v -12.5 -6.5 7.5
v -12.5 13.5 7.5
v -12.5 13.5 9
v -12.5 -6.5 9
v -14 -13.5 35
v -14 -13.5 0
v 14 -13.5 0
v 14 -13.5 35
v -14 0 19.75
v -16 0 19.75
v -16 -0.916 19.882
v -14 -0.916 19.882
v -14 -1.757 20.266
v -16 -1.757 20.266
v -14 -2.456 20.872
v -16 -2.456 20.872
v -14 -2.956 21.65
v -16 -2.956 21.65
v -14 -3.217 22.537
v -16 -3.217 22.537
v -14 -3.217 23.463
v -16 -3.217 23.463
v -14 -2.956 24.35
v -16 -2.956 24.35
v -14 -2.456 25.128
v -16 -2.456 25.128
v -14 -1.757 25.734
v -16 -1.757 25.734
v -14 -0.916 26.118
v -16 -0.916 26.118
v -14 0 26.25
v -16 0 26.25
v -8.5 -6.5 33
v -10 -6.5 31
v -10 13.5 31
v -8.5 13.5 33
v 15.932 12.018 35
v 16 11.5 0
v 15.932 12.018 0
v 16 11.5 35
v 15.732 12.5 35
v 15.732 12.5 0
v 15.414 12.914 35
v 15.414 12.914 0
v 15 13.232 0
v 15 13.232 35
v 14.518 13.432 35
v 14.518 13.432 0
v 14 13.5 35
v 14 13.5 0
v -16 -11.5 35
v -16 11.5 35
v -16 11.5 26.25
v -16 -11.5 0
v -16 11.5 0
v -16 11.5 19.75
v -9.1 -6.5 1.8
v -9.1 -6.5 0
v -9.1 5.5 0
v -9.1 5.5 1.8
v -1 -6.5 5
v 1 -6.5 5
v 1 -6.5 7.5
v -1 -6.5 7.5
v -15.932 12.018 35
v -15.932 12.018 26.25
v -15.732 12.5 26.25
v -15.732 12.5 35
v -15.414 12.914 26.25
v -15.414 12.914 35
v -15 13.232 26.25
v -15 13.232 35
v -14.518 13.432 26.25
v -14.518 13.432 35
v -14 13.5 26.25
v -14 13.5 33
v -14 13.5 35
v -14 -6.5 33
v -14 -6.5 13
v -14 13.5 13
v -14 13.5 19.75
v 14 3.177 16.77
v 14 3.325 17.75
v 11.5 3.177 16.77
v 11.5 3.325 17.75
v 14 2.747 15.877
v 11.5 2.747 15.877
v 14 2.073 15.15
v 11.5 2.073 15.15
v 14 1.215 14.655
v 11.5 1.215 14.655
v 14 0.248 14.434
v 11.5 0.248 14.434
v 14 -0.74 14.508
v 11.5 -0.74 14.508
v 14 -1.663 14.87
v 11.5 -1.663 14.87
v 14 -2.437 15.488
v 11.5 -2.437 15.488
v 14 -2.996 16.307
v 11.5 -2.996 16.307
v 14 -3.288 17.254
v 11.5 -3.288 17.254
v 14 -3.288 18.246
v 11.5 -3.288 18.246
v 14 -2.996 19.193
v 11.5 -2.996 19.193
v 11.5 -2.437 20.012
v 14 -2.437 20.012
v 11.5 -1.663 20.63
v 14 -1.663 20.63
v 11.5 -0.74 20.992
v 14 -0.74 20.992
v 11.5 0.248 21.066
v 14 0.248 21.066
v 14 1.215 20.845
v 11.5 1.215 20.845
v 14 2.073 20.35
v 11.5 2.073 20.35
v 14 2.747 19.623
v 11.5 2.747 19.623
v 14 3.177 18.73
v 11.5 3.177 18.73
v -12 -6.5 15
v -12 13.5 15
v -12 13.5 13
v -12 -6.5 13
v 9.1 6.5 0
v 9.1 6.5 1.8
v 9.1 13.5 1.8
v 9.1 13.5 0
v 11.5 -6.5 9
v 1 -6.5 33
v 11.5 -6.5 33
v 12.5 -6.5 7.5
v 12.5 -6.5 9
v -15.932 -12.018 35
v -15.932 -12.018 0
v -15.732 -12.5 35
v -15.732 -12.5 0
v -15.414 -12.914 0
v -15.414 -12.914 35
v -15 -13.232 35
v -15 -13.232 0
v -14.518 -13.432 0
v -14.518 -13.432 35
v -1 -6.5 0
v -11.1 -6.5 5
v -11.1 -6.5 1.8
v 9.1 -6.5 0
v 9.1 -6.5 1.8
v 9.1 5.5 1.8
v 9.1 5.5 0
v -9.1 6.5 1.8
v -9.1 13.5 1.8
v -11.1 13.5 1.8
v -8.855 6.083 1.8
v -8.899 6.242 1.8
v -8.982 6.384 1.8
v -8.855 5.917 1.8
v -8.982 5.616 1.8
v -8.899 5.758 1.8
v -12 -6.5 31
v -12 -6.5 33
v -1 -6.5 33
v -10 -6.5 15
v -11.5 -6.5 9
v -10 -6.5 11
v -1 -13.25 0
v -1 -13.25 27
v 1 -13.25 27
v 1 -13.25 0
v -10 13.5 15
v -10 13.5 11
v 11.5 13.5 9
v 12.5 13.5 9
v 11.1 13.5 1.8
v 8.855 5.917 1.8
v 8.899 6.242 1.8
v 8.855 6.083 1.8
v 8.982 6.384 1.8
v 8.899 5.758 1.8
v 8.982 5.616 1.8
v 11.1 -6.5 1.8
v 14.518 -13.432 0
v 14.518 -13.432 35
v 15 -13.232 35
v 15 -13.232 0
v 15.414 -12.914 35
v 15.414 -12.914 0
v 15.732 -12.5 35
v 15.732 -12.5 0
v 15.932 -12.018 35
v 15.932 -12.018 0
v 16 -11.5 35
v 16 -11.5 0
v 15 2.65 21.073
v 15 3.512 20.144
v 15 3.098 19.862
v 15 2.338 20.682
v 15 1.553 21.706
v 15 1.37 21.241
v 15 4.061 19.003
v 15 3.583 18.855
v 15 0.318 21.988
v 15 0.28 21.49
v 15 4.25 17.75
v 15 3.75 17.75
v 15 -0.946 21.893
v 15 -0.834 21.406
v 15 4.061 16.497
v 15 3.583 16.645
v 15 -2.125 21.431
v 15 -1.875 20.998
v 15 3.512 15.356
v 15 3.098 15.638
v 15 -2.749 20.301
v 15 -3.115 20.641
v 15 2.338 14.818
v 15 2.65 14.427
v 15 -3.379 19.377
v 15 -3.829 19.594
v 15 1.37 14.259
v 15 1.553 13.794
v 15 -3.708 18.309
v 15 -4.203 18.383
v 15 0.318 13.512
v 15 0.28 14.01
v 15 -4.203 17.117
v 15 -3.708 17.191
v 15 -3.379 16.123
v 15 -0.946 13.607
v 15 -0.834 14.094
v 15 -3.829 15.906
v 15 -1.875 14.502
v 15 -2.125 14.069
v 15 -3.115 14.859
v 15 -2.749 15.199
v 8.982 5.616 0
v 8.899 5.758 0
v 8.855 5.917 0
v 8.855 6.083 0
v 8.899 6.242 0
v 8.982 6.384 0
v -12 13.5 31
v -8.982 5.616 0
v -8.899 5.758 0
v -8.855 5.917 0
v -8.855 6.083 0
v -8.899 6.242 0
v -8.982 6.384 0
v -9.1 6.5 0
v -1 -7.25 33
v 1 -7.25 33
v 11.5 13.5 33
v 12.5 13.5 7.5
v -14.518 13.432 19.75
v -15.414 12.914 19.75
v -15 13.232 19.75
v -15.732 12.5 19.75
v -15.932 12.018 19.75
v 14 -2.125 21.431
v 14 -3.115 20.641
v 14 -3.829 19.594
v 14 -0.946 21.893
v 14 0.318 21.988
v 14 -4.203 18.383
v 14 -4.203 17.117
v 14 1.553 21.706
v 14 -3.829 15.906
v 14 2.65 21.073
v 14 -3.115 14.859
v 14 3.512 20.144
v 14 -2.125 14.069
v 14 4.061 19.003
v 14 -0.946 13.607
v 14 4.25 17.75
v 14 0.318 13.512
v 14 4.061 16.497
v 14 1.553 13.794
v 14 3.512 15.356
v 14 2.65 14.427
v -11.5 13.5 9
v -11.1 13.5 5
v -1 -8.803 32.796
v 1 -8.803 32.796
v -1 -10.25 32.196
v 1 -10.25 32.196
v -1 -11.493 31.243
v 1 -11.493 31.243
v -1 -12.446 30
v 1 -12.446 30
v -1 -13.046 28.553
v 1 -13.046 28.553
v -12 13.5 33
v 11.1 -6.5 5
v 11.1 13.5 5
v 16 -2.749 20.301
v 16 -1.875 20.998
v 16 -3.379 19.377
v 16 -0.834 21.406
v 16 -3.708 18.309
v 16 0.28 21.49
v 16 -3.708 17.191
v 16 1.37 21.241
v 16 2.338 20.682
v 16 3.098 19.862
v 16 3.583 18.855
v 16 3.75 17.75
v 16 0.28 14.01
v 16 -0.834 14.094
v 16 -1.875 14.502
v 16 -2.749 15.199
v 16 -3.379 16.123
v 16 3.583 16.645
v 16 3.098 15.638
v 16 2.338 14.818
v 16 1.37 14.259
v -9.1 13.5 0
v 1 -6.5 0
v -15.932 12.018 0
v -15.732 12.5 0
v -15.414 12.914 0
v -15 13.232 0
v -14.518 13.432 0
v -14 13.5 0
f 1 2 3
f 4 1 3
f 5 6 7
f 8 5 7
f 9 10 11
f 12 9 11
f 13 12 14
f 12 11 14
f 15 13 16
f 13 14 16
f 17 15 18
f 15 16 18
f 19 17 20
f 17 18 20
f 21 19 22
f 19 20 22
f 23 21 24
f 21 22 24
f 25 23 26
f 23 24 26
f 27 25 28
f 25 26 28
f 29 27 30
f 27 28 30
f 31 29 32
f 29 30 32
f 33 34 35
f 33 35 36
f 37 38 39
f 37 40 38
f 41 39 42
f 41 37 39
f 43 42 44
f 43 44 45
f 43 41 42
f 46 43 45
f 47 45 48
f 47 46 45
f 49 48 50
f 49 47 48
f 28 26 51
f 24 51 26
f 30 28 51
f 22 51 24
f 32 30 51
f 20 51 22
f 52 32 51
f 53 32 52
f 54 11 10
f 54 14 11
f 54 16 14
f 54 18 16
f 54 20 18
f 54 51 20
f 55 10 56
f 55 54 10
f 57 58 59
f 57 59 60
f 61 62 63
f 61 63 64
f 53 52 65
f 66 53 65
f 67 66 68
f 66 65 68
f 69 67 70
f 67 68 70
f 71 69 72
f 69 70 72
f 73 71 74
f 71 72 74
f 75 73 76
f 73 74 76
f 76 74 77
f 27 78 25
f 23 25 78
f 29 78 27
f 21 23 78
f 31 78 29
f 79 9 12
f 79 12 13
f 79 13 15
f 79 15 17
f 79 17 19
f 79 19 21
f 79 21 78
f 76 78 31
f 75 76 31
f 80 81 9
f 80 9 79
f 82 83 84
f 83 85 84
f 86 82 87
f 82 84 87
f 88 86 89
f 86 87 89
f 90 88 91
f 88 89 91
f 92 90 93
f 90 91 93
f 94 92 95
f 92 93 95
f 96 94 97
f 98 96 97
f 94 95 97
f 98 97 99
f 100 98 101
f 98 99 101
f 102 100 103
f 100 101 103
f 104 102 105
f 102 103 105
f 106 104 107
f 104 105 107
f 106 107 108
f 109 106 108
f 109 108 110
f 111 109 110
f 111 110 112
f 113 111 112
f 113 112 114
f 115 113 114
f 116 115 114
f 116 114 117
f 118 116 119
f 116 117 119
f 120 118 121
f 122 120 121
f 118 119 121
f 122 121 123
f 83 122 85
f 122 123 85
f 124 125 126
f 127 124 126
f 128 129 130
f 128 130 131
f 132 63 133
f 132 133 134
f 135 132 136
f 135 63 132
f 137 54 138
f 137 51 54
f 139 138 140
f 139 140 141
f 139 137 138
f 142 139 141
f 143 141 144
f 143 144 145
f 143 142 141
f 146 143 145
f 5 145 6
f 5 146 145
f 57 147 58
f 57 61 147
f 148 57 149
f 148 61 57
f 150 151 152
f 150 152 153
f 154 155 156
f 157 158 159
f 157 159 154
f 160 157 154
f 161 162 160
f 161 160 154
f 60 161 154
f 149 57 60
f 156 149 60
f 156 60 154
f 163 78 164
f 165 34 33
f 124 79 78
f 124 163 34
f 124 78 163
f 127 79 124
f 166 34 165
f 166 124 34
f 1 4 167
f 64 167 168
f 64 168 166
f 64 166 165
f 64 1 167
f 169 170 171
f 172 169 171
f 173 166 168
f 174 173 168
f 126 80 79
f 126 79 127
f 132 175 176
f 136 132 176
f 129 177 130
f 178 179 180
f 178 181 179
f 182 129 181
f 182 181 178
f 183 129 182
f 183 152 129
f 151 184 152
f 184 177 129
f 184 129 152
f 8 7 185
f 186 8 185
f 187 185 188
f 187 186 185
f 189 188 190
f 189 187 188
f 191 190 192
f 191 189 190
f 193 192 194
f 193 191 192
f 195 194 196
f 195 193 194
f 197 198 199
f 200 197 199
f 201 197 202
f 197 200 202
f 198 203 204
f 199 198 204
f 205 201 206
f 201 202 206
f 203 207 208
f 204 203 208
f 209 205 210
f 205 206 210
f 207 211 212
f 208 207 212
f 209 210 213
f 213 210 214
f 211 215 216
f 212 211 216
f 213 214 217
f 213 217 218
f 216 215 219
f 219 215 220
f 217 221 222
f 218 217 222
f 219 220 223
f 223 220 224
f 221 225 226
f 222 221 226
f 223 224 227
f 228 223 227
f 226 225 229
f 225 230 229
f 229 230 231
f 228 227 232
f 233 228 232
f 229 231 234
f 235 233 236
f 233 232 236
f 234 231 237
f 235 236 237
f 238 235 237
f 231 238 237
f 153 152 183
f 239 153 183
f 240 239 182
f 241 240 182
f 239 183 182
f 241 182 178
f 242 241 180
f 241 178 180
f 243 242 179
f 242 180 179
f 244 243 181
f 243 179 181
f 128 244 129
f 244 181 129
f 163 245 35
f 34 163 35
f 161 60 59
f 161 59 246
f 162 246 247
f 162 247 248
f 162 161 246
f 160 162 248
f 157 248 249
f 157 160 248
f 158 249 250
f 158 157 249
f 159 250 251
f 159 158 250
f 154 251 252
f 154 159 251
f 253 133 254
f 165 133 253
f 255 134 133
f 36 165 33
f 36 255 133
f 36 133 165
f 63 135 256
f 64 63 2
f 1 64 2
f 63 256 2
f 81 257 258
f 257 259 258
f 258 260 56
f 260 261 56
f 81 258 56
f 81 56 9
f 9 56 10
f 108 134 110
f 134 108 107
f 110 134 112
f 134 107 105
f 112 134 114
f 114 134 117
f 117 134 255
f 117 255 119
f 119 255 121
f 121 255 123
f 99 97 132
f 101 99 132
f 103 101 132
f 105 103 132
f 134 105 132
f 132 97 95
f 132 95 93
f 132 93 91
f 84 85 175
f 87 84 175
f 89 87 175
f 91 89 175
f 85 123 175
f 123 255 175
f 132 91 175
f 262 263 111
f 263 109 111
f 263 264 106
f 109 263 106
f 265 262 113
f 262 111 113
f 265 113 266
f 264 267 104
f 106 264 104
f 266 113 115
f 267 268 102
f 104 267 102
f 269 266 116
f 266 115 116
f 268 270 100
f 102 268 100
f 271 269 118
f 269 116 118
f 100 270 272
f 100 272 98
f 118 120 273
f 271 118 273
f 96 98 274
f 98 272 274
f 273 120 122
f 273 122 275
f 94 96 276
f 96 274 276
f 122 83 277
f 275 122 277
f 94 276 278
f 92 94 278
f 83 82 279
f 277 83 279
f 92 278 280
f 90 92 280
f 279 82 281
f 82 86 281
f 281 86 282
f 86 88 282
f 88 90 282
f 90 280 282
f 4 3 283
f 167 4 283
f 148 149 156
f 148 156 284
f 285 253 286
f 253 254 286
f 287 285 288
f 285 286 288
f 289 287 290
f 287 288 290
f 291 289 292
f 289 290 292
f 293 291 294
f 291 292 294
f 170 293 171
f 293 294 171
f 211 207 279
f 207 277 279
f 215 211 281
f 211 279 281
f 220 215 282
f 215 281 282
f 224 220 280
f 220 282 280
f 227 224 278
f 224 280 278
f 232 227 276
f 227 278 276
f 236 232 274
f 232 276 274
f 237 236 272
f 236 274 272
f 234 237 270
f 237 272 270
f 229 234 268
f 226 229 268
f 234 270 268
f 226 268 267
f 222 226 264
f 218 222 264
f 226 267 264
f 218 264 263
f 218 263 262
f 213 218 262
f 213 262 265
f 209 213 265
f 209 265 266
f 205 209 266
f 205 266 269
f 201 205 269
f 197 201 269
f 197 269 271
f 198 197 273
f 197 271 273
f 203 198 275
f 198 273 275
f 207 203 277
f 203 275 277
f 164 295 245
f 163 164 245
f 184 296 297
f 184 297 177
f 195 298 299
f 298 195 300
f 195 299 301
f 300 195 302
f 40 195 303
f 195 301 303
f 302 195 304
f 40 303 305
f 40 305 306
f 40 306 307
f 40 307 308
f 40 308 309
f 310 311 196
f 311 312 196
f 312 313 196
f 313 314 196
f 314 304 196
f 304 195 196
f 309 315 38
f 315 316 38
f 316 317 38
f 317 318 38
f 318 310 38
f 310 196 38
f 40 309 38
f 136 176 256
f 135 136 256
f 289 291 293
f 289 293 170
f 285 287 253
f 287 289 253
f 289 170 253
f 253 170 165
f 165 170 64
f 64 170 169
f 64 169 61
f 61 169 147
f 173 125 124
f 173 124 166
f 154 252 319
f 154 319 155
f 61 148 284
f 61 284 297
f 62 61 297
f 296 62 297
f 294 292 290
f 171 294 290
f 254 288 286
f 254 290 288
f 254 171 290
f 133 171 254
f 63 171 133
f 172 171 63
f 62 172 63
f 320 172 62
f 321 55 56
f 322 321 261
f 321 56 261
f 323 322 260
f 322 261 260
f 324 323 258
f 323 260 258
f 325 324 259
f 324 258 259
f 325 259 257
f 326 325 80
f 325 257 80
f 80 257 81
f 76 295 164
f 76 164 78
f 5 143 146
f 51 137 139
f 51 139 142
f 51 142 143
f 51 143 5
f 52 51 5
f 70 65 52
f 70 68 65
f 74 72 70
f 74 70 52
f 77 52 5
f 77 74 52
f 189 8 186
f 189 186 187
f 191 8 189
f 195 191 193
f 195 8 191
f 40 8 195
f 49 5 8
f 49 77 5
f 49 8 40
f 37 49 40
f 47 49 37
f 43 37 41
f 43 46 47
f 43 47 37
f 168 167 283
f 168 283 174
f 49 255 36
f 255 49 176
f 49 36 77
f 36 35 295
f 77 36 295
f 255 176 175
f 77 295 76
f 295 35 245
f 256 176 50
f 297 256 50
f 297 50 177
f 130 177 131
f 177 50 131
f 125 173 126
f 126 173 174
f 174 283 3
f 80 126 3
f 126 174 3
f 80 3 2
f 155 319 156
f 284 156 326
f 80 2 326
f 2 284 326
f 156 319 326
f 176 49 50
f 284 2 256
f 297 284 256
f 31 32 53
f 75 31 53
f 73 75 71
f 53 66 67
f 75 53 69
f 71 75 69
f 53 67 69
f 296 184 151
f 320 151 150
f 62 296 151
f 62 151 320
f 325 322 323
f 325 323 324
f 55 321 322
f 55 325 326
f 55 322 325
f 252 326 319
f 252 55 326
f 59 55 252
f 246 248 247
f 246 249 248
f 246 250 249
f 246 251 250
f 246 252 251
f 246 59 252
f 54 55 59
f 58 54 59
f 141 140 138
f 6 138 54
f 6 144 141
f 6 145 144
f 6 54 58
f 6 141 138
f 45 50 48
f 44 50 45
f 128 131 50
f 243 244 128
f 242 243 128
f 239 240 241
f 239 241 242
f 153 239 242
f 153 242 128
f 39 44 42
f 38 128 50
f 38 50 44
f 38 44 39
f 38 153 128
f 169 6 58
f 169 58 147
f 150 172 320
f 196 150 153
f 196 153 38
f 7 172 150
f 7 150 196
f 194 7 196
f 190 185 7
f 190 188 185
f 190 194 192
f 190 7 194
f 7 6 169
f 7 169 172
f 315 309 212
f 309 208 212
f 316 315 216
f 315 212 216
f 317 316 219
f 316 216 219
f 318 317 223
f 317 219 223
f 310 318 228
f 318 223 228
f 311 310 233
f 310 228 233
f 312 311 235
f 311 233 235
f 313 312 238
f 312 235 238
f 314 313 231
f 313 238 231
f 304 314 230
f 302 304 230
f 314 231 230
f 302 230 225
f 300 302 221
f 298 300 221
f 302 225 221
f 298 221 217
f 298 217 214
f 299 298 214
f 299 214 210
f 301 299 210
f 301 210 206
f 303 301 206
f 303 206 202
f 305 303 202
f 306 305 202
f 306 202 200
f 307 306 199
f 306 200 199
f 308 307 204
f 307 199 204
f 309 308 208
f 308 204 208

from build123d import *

# Parameters (mm, degrees)
SKETCH1_W               = 32
SKETCH1_H               = 27
BOSS_EXTRUDE1_DEPTH     = 35
FILLET1_R               = 2
CUT_EXTRUDE1_DEPTH      = 1
CUT_EXTRUDE1_DEPTH_BACK = 28
BOSS_EXTRUDE2_DEPTH     = 7
BOSS_EXTRUDE3_DEPTH     = 1.8
SKETCH5_W               = 2
SKETCH5_H               = 7
CUT_EXTRUDE2_DEPTH      = 33
CUT_EXTRUDE3_DEPTH      = 20
SKETCH7_W               = 2
SKETCH7_H               = 33
BOSS_EXTRUDE4_DEPTH     = 0.25
FILLET2_R               = 6
CUT_EXTRUDE5_DEPTH      = 4.5
SKETCH14_W              = 2.5
SKETCH14_H              = 20
CUT_EXTRUDE6_DEPTH      = 20
SKETCH16_W              = 2
SKETCH16_H              = 4
SKETCH16_H_2            = 2
BOSS_EXTRUDE5_DEPTH     = 20
BOSS_EXTRUDE6_DEPTH     = 20


with BuildPart() as part:
    # Sketch1 → Boss-Extrude1 (new body)
    with BuildSketch(Plane.XY):
        Rectangle(SKETCH1_W, SKETCH1_H)
    extrude(amount=BOSS_EXTRUDE1_DEPTH)

    # Fillet1
    fillet1_edges = [part.edges().sort_by_distance(p)[0] for p in [
        (16, -13.5, 17.5),
        (-16, -13.5, 17.5),
        (-16, 13.5, 17.5),
        (16, 13.5, 17.5),
    ]]
    fillet(fillet1_edges, radius=FILLET1_R)

    # Sketch2 → Cut-Extrude1 (cut, two sides)
    with BuildSketch(Plane.XZ.offset(13.5)) as cut_extrude1_sk:
        Polygon((-9.1, 0), (-9.1, 1.8), (-11.1, 1.8), (-11.1, 5), (11.1, 5), (11.1, 1.8), (9.1, 1.8), (9.1, 0), align=None)
    extrude(amount=CUT_EXTRUDE1_DEPTH, mode=Mode.SUBTRACT)
    extrude(cut_extrude1_sk.sketch, amount=-CUT_EXTRUDE1_DEPTH_BACK, mode=Mode.SUBTRACT)

    # Sketch3 → Boss-Extrude2 (add)
    with BuildSketch(Plane.XZ.offset(13.5)):
        Polygon((-9.1, 0), (-9.1, 1.8), (-11.1, 1.8), (-11.1, 5), (11.1, 5), (11.1, 1.8), (9.1, 1.8), (9.1, 0), align=None)
    extrude(amount=-BOSS_EXTRUDE2_DEPTH)

    # Sketch4 → Boss-Extrude3 (add)
    with BuildSketch(Plane(origin=(0, 0, 1.8), x_dir=(-1, 0, 0), z_dir=(0, 0, -1))):
        with BuildLine():
            Line((-9.1, 6.5), (-9.1, 5.5))
            ThreePointArc((-9.1, 5.5), (-8.85, 6), (-9.1, 6.5))
        make_face()
    boss_extrude3 = extrude(amount=BOSS_EXTRUDE3_DEPTH)

    # Mirror1: Boss-Extrude3 across plane
    add(boss_extrude3.mirror(Plane(origin=(0, 0, 0), x_dir=(0, 0, 1), z_dir=(1, 0, 0))))

    # Sketch5 → Cut-Extrude2 (cut)
    with BuildSketch(Plane(origin=(0, 0, 0), x_dir=(-1, 0, 0), z_dir=(0, 0, -1))):
        with Locations((0, -10)):
            Rectangle(SKETCH5_W, SKETCH5_H)
    extrude(amount=-CUT_EXTRUDE2_DEPTH, mode=Mode.SUBTRACT)

    # Sketch6 → Cut-Extrude3 (cut)
    with BuildSketch(Plane(origin=(0, 13.5, 0), x_dir=(1, 0, 0), z_dir=(0, 1, 0))):
        Polygon((-12.5, -7.5), (-12.5, -9), (-11.5, -9), (-11.5, -33), (11.5, -33), (11.5, -9), (12.5, -9), (12.5, -7.5), align=None)
    extrude(amount=-CUT_EXTRUDE3_DEPTH, mode=Mode.SUBTRACT)

    # Sketch7 → Boss-Extrude4 (add)
    with BuildSketch(Plane.XZ.offset(13.5)):
        with Locations((0, 16.5)):
            Rectangle(SKETCH7_W, SKETCH7_H)
    extrude(amount=-BOSS_EXTRUDE4_DEPTH)

    # Fillet2
    fillet2_edges = [part.edges().sort_by_distance(p)[0] for p in [
        (0, -13.25, 33),
    ]]
    fillet(fillet2_edges, radius=FILLET2_R)

    # Sketch9 → Cut-Revolve1 (revolve, cut)
    with BuildSketch(Plane(origin=(0, 0, 17.75), x_dir=(-1, 0, 0), z_dir=(0, 0, -1))):
        Polygon((-15, 4.25), (-14, 4.25), (-14, 3.325), (-11.5, 3.325), (-11.5, 0), (-16, 0), (-16, 3.75), (-15, 3.75), align=None)
    revolve(axis=Axis((16, 0, 17.75), (-1, 0, 0)), mode=Mode.SUBTRACT)

    # Sketch11 → Cut-Extrude5 (cut)
    with BuildSketch(Plane(origin=(-16, 0, 44), x_dir=(0, 0, -1), z_dir=(1, 0, 0))):
        with BuildLine():
            Line((24.25, 23), (24.25, 0))
            ThreePointArc((24.25, 0), (21, -3.25), (17.75, 0))
            Line((17.75, 0), (17.75, 23))
            ThreePointArc((17.75, 23), (21, 26.25), (24.25, 23))
        make_face()
    extrude(amount=CUT_EXTRUDE5_DEPTH, mode=Mode.SUBTRACT)

    # Sketch14 → Cut-Extrude6 (cut)
    with BuildSketch(Plane(origin=(0, 13.5, 0), x_dir=(1, 0, 0), z_dir=(0, 1, 0))):
        with Locations((-12.75, -23)):
            Rectangle(SKETCH14_W, SKETCH14_H)
    extrude(amount=-CUT_EXTRUDE6_DEPTH, mode=Mode.SUBTRACT)

    # Sketch16 → Boss-Extrude5 (add)
    with BuildSketch(Plane(origin=(0, 13.5, 0), x_dir=(1, 0, 0), z_dir=(0, 1, 0))):
        with Locations((-11, -13)):
            Rectangle(SKETCH16_W, SKETCH16_H)
        with Locations((-11, -32)):
            Rectangle(SKETCH16_W, SKETCH16_H_2)
    extrude(amount=-BOSS_EXTRUDE5_DEPTH)

    # Sketch20 → Boss-Extrude6 (add)
    with BuildSketch(Plane(origin=(0, 13.5, 0), x_dir=(1, 0, 0), z_dir=(0, 1, 0))):
        Polygon((-11.5, -9), (-10, -11), (-11.5, -11), align=None)
        Polygon((-10, -31), (-8.5, -33), (-10, -33), align=None)
    extrude(amount=-BOSS_EXTRUDE6_DEPTH)


solid = part.part
